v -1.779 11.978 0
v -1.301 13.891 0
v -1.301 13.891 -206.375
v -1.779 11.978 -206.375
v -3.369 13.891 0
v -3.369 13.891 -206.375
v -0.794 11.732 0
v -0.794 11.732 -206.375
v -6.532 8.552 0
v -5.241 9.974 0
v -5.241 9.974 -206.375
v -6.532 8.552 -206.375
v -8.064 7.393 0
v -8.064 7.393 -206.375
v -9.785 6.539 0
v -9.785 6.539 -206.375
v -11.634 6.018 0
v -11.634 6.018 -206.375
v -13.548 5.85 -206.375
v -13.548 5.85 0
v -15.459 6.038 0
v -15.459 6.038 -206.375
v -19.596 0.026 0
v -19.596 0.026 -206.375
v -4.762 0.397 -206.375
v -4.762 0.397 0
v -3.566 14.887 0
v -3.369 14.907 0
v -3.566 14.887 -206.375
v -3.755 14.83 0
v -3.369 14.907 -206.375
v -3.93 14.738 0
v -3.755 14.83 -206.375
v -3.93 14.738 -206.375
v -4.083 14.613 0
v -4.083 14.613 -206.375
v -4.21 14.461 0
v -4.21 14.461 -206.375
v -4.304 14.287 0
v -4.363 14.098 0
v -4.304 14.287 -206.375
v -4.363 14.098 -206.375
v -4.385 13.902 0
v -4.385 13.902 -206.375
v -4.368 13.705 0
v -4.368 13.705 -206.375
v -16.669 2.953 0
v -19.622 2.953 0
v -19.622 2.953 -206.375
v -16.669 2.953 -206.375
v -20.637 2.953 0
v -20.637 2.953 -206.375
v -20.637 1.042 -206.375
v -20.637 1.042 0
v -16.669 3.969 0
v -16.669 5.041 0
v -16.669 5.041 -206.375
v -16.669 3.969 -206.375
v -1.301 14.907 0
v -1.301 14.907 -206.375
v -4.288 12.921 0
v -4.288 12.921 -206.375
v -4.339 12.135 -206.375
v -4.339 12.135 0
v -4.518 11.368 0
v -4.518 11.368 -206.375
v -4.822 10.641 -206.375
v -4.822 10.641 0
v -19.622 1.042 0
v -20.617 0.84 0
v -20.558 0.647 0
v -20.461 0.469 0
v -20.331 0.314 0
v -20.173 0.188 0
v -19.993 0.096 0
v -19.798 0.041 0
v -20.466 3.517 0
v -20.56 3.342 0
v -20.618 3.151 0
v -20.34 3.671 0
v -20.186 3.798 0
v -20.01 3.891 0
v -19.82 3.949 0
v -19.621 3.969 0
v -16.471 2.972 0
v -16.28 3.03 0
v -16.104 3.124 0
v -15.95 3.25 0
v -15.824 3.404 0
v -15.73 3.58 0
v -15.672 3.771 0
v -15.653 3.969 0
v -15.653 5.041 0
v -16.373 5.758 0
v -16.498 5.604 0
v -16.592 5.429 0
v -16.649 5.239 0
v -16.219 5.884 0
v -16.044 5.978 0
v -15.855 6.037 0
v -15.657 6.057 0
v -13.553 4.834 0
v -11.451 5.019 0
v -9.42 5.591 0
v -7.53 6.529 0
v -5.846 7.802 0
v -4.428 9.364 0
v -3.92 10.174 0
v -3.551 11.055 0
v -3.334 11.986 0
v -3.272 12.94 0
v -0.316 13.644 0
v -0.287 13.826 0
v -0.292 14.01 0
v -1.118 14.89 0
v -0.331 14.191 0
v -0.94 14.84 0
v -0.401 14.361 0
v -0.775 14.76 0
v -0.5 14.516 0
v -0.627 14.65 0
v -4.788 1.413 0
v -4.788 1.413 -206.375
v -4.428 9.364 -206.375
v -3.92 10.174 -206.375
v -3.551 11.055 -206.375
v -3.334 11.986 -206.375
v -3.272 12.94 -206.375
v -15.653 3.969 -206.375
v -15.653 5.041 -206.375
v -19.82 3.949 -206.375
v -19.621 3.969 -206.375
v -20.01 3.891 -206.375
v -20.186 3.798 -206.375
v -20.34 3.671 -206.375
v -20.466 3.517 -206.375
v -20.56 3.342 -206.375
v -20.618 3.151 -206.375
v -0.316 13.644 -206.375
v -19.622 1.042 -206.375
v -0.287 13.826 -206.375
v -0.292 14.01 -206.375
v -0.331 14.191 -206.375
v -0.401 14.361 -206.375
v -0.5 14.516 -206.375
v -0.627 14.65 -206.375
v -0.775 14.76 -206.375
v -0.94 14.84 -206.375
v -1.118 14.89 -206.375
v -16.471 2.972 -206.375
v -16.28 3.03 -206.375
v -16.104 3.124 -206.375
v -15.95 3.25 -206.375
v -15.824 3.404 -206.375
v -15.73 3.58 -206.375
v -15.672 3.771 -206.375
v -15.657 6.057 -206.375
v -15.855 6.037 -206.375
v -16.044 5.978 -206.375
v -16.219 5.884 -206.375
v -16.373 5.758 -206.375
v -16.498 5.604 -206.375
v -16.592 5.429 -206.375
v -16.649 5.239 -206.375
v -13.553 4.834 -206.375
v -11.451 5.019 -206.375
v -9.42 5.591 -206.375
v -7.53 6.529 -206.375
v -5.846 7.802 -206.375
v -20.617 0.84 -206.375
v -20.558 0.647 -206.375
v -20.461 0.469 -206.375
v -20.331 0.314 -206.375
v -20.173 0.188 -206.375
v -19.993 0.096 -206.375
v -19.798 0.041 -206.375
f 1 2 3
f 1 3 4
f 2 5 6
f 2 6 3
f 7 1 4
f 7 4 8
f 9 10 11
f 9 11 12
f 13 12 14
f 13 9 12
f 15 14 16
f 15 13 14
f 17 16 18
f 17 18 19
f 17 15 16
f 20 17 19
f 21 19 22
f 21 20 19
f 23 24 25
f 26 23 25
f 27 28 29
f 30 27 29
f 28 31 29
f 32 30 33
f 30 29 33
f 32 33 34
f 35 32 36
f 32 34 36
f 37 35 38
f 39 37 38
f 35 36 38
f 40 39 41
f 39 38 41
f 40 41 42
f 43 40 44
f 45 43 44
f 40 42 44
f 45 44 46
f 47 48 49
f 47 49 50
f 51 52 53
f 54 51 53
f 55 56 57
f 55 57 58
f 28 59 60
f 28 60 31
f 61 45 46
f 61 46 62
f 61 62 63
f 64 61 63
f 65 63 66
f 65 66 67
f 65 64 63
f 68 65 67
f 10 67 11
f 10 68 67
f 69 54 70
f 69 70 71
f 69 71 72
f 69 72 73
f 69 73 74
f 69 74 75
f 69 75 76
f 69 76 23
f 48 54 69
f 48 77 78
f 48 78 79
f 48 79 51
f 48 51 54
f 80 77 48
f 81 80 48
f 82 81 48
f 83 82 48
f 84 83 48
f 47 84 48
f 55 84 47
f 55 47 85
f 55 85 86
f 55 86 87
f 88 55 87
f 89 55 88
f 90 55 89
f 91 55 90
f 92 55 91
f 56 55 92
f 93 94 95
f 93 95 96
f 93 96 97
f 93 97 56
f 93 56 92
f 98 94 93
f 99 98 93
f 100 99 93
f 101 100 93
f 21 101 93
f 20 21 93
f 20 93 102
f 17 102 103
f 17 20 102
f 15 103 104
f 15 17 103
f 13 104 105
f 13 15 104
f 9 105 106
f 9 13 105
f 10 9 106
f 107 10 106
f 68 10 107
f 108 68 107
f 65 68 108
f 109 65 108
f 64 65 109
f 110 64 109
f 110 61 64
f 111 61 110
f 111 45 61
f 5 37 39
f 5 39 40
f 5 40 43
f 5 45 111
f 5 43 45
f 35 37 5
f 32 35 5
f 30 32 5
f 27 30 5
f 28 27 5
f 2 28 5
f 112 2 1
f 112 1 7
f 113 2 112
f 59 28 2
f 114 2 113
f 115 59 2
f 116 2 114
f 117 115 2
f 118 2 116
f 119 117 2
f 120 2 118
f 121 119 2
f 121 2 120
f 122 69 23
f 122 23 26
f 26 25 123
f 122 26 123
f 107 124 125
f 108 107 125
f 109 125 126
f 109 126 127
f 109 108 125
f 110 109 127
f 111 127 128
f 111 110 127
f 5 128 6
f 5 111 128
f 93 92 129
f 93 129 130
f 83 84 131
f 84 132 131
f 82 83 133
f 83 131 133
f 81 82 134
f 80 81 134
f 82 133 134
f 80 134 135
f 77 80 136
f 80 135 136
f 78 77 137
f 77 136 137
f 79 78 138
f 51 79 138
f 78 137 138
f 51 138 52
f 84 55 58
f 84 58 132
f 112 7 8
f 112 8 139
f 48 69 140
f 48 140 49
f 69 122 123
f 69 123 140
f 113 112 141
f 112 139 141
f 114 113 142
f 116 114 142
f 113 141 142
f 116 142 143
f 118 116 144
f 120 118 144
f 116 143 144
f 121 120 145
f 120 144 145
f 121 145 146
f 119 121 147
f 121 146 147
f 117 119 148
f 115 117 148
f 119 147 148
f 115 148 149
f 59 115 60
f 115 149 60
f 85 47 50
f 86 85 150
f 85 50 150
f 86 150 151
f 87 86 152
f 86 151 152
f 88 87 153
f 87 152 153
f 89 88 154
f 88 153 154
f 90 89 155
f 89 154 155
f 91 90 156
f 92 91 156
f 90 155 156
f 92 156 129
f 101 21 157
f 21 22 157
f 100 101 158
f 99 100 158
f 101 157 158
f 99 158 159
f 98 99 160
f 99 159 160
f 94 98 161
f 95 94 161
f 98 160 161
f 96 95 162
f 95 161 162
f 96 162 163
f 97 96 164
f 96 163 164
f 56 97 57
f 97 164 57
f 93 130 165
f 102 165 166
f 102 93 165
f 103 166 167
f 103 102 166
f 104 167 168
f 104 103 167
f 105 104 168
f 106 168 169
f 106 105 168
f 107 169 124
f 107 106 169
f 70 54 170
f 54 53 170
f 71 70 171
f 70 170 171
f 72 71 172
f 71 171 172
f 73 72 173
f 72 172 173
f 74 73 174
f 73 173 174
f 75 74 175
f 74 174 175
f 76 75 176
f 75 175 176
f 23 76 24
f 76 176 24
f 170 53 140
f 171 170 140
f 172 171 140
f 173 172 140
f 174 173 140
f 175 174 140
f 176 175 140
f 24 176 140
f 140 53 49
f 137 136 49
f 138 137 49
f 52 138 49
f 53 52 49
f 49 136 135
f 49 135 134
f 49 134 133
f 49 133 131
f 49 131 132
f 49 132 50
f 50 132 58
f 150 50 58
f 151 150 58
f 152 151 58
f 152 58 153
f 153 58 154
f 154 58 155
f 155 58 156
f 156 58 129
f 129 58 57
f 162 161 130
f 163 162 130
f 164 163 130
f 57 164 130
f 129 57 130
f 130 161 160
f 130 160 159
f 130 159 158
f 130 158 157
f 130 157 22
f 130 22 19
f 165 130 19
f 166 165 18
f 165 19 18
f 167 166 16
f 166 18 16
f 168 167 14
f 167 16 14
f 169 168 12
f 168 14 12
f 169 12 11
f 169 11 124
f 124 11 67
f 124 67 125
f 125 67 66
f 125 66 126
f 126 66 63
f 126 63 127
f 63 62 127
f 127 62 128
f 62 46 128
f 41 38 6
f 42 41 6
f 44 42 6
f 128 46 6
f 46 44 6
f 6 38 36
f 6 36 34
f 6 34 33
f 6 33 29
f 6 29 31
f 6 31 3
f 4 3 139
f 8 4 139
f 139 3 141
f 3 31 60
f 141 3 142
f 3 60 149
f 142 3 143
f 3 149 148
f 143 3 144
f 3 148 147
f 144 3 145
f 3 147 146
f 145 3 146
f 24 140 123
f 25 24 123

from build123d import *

# Parameters (mm, degrees)
EXTRUDE_THIN1_DEPTH = 206.375
FILLET1_R           = 1.016


with BuildPart() as part:
    # Sketch1 → Extrude-Thin1 (new body)
    with BuildSketch(Plane.XY):
        with BuildLine():
            Line((-0.79375, 11.731625), (0, 14.906625))
            Line((0, 14.906625), (-4.7625, 14.906625))
            ThreePointArc((-4.7625, 14.906625), (-4.309569444, 12.373308652), (-5.240769358, 9.974203708))
            ThreePointArc((-5.240769358, 9.974203708), (-10.374425557, 6.332169642), (-16.66875, 6.35))
            Line((-16.66875, 6.35), (-16.66875, 3.96875))
            Line((-16.66875, 3.96875), (-20.6375, 3.96875))
            Line((-20.6375, 3.96875), (-20.6375, 0))
            Line((-20.6375, 0), (-4.7625, 0.396875))
            Line((-4.7625, 0.396875), (-4.787892066, 1.412557649))
            Line((-4.787892066, 1.412557649), (-19.6215, 1.04171745))
            Line((-19.6215, 1.04171745), (-19.6215, 2.95275))
            Line((-19.6215, 2.95275), (-15.65275, 2.95275))
            Line((-15.65275, 2.95275), (-15.65275, 5.040913964))
            ThreePointArc((-15.65275, 5.040913964), (-9.419658883, 5.590889524), (-4.428168187, 9.364338693))
            ThreePointArc((-4.428168187, 9.364338693), (-3.423343097, 11.516274139), (-3.36895913, 13.890625))
            Line((-3.36895913, 13.890625), (-1.301268829, 13.890625))
            Line((-1.301268829, 13.890625), (-1.77941478, 11.978041195))
            Line((-1.77941478, 11.978041195), (-0.79375, 11.731625))
        make_face()
    extrude(amount=-EXTRUDE_THIN1_DEPTH)

    # Fillet1
    fillet1_edges = [part.edges().sort_by_distance(p)[0] for p in [
        (-20.6375, 0, -103.1875),
        (-20.6375, 3.96875, -103.1875),
        (-16.66875, 6.35, -103.1875),
        (-4.7625, 14.906625, -103.1875),
        (0, 14.906625, -103.1875),
        (-15.65275, 2.95275, -103.1875),
    ]]
    fillet(fillet1_edges, radius=FILLET1_R)


solid = part.part
